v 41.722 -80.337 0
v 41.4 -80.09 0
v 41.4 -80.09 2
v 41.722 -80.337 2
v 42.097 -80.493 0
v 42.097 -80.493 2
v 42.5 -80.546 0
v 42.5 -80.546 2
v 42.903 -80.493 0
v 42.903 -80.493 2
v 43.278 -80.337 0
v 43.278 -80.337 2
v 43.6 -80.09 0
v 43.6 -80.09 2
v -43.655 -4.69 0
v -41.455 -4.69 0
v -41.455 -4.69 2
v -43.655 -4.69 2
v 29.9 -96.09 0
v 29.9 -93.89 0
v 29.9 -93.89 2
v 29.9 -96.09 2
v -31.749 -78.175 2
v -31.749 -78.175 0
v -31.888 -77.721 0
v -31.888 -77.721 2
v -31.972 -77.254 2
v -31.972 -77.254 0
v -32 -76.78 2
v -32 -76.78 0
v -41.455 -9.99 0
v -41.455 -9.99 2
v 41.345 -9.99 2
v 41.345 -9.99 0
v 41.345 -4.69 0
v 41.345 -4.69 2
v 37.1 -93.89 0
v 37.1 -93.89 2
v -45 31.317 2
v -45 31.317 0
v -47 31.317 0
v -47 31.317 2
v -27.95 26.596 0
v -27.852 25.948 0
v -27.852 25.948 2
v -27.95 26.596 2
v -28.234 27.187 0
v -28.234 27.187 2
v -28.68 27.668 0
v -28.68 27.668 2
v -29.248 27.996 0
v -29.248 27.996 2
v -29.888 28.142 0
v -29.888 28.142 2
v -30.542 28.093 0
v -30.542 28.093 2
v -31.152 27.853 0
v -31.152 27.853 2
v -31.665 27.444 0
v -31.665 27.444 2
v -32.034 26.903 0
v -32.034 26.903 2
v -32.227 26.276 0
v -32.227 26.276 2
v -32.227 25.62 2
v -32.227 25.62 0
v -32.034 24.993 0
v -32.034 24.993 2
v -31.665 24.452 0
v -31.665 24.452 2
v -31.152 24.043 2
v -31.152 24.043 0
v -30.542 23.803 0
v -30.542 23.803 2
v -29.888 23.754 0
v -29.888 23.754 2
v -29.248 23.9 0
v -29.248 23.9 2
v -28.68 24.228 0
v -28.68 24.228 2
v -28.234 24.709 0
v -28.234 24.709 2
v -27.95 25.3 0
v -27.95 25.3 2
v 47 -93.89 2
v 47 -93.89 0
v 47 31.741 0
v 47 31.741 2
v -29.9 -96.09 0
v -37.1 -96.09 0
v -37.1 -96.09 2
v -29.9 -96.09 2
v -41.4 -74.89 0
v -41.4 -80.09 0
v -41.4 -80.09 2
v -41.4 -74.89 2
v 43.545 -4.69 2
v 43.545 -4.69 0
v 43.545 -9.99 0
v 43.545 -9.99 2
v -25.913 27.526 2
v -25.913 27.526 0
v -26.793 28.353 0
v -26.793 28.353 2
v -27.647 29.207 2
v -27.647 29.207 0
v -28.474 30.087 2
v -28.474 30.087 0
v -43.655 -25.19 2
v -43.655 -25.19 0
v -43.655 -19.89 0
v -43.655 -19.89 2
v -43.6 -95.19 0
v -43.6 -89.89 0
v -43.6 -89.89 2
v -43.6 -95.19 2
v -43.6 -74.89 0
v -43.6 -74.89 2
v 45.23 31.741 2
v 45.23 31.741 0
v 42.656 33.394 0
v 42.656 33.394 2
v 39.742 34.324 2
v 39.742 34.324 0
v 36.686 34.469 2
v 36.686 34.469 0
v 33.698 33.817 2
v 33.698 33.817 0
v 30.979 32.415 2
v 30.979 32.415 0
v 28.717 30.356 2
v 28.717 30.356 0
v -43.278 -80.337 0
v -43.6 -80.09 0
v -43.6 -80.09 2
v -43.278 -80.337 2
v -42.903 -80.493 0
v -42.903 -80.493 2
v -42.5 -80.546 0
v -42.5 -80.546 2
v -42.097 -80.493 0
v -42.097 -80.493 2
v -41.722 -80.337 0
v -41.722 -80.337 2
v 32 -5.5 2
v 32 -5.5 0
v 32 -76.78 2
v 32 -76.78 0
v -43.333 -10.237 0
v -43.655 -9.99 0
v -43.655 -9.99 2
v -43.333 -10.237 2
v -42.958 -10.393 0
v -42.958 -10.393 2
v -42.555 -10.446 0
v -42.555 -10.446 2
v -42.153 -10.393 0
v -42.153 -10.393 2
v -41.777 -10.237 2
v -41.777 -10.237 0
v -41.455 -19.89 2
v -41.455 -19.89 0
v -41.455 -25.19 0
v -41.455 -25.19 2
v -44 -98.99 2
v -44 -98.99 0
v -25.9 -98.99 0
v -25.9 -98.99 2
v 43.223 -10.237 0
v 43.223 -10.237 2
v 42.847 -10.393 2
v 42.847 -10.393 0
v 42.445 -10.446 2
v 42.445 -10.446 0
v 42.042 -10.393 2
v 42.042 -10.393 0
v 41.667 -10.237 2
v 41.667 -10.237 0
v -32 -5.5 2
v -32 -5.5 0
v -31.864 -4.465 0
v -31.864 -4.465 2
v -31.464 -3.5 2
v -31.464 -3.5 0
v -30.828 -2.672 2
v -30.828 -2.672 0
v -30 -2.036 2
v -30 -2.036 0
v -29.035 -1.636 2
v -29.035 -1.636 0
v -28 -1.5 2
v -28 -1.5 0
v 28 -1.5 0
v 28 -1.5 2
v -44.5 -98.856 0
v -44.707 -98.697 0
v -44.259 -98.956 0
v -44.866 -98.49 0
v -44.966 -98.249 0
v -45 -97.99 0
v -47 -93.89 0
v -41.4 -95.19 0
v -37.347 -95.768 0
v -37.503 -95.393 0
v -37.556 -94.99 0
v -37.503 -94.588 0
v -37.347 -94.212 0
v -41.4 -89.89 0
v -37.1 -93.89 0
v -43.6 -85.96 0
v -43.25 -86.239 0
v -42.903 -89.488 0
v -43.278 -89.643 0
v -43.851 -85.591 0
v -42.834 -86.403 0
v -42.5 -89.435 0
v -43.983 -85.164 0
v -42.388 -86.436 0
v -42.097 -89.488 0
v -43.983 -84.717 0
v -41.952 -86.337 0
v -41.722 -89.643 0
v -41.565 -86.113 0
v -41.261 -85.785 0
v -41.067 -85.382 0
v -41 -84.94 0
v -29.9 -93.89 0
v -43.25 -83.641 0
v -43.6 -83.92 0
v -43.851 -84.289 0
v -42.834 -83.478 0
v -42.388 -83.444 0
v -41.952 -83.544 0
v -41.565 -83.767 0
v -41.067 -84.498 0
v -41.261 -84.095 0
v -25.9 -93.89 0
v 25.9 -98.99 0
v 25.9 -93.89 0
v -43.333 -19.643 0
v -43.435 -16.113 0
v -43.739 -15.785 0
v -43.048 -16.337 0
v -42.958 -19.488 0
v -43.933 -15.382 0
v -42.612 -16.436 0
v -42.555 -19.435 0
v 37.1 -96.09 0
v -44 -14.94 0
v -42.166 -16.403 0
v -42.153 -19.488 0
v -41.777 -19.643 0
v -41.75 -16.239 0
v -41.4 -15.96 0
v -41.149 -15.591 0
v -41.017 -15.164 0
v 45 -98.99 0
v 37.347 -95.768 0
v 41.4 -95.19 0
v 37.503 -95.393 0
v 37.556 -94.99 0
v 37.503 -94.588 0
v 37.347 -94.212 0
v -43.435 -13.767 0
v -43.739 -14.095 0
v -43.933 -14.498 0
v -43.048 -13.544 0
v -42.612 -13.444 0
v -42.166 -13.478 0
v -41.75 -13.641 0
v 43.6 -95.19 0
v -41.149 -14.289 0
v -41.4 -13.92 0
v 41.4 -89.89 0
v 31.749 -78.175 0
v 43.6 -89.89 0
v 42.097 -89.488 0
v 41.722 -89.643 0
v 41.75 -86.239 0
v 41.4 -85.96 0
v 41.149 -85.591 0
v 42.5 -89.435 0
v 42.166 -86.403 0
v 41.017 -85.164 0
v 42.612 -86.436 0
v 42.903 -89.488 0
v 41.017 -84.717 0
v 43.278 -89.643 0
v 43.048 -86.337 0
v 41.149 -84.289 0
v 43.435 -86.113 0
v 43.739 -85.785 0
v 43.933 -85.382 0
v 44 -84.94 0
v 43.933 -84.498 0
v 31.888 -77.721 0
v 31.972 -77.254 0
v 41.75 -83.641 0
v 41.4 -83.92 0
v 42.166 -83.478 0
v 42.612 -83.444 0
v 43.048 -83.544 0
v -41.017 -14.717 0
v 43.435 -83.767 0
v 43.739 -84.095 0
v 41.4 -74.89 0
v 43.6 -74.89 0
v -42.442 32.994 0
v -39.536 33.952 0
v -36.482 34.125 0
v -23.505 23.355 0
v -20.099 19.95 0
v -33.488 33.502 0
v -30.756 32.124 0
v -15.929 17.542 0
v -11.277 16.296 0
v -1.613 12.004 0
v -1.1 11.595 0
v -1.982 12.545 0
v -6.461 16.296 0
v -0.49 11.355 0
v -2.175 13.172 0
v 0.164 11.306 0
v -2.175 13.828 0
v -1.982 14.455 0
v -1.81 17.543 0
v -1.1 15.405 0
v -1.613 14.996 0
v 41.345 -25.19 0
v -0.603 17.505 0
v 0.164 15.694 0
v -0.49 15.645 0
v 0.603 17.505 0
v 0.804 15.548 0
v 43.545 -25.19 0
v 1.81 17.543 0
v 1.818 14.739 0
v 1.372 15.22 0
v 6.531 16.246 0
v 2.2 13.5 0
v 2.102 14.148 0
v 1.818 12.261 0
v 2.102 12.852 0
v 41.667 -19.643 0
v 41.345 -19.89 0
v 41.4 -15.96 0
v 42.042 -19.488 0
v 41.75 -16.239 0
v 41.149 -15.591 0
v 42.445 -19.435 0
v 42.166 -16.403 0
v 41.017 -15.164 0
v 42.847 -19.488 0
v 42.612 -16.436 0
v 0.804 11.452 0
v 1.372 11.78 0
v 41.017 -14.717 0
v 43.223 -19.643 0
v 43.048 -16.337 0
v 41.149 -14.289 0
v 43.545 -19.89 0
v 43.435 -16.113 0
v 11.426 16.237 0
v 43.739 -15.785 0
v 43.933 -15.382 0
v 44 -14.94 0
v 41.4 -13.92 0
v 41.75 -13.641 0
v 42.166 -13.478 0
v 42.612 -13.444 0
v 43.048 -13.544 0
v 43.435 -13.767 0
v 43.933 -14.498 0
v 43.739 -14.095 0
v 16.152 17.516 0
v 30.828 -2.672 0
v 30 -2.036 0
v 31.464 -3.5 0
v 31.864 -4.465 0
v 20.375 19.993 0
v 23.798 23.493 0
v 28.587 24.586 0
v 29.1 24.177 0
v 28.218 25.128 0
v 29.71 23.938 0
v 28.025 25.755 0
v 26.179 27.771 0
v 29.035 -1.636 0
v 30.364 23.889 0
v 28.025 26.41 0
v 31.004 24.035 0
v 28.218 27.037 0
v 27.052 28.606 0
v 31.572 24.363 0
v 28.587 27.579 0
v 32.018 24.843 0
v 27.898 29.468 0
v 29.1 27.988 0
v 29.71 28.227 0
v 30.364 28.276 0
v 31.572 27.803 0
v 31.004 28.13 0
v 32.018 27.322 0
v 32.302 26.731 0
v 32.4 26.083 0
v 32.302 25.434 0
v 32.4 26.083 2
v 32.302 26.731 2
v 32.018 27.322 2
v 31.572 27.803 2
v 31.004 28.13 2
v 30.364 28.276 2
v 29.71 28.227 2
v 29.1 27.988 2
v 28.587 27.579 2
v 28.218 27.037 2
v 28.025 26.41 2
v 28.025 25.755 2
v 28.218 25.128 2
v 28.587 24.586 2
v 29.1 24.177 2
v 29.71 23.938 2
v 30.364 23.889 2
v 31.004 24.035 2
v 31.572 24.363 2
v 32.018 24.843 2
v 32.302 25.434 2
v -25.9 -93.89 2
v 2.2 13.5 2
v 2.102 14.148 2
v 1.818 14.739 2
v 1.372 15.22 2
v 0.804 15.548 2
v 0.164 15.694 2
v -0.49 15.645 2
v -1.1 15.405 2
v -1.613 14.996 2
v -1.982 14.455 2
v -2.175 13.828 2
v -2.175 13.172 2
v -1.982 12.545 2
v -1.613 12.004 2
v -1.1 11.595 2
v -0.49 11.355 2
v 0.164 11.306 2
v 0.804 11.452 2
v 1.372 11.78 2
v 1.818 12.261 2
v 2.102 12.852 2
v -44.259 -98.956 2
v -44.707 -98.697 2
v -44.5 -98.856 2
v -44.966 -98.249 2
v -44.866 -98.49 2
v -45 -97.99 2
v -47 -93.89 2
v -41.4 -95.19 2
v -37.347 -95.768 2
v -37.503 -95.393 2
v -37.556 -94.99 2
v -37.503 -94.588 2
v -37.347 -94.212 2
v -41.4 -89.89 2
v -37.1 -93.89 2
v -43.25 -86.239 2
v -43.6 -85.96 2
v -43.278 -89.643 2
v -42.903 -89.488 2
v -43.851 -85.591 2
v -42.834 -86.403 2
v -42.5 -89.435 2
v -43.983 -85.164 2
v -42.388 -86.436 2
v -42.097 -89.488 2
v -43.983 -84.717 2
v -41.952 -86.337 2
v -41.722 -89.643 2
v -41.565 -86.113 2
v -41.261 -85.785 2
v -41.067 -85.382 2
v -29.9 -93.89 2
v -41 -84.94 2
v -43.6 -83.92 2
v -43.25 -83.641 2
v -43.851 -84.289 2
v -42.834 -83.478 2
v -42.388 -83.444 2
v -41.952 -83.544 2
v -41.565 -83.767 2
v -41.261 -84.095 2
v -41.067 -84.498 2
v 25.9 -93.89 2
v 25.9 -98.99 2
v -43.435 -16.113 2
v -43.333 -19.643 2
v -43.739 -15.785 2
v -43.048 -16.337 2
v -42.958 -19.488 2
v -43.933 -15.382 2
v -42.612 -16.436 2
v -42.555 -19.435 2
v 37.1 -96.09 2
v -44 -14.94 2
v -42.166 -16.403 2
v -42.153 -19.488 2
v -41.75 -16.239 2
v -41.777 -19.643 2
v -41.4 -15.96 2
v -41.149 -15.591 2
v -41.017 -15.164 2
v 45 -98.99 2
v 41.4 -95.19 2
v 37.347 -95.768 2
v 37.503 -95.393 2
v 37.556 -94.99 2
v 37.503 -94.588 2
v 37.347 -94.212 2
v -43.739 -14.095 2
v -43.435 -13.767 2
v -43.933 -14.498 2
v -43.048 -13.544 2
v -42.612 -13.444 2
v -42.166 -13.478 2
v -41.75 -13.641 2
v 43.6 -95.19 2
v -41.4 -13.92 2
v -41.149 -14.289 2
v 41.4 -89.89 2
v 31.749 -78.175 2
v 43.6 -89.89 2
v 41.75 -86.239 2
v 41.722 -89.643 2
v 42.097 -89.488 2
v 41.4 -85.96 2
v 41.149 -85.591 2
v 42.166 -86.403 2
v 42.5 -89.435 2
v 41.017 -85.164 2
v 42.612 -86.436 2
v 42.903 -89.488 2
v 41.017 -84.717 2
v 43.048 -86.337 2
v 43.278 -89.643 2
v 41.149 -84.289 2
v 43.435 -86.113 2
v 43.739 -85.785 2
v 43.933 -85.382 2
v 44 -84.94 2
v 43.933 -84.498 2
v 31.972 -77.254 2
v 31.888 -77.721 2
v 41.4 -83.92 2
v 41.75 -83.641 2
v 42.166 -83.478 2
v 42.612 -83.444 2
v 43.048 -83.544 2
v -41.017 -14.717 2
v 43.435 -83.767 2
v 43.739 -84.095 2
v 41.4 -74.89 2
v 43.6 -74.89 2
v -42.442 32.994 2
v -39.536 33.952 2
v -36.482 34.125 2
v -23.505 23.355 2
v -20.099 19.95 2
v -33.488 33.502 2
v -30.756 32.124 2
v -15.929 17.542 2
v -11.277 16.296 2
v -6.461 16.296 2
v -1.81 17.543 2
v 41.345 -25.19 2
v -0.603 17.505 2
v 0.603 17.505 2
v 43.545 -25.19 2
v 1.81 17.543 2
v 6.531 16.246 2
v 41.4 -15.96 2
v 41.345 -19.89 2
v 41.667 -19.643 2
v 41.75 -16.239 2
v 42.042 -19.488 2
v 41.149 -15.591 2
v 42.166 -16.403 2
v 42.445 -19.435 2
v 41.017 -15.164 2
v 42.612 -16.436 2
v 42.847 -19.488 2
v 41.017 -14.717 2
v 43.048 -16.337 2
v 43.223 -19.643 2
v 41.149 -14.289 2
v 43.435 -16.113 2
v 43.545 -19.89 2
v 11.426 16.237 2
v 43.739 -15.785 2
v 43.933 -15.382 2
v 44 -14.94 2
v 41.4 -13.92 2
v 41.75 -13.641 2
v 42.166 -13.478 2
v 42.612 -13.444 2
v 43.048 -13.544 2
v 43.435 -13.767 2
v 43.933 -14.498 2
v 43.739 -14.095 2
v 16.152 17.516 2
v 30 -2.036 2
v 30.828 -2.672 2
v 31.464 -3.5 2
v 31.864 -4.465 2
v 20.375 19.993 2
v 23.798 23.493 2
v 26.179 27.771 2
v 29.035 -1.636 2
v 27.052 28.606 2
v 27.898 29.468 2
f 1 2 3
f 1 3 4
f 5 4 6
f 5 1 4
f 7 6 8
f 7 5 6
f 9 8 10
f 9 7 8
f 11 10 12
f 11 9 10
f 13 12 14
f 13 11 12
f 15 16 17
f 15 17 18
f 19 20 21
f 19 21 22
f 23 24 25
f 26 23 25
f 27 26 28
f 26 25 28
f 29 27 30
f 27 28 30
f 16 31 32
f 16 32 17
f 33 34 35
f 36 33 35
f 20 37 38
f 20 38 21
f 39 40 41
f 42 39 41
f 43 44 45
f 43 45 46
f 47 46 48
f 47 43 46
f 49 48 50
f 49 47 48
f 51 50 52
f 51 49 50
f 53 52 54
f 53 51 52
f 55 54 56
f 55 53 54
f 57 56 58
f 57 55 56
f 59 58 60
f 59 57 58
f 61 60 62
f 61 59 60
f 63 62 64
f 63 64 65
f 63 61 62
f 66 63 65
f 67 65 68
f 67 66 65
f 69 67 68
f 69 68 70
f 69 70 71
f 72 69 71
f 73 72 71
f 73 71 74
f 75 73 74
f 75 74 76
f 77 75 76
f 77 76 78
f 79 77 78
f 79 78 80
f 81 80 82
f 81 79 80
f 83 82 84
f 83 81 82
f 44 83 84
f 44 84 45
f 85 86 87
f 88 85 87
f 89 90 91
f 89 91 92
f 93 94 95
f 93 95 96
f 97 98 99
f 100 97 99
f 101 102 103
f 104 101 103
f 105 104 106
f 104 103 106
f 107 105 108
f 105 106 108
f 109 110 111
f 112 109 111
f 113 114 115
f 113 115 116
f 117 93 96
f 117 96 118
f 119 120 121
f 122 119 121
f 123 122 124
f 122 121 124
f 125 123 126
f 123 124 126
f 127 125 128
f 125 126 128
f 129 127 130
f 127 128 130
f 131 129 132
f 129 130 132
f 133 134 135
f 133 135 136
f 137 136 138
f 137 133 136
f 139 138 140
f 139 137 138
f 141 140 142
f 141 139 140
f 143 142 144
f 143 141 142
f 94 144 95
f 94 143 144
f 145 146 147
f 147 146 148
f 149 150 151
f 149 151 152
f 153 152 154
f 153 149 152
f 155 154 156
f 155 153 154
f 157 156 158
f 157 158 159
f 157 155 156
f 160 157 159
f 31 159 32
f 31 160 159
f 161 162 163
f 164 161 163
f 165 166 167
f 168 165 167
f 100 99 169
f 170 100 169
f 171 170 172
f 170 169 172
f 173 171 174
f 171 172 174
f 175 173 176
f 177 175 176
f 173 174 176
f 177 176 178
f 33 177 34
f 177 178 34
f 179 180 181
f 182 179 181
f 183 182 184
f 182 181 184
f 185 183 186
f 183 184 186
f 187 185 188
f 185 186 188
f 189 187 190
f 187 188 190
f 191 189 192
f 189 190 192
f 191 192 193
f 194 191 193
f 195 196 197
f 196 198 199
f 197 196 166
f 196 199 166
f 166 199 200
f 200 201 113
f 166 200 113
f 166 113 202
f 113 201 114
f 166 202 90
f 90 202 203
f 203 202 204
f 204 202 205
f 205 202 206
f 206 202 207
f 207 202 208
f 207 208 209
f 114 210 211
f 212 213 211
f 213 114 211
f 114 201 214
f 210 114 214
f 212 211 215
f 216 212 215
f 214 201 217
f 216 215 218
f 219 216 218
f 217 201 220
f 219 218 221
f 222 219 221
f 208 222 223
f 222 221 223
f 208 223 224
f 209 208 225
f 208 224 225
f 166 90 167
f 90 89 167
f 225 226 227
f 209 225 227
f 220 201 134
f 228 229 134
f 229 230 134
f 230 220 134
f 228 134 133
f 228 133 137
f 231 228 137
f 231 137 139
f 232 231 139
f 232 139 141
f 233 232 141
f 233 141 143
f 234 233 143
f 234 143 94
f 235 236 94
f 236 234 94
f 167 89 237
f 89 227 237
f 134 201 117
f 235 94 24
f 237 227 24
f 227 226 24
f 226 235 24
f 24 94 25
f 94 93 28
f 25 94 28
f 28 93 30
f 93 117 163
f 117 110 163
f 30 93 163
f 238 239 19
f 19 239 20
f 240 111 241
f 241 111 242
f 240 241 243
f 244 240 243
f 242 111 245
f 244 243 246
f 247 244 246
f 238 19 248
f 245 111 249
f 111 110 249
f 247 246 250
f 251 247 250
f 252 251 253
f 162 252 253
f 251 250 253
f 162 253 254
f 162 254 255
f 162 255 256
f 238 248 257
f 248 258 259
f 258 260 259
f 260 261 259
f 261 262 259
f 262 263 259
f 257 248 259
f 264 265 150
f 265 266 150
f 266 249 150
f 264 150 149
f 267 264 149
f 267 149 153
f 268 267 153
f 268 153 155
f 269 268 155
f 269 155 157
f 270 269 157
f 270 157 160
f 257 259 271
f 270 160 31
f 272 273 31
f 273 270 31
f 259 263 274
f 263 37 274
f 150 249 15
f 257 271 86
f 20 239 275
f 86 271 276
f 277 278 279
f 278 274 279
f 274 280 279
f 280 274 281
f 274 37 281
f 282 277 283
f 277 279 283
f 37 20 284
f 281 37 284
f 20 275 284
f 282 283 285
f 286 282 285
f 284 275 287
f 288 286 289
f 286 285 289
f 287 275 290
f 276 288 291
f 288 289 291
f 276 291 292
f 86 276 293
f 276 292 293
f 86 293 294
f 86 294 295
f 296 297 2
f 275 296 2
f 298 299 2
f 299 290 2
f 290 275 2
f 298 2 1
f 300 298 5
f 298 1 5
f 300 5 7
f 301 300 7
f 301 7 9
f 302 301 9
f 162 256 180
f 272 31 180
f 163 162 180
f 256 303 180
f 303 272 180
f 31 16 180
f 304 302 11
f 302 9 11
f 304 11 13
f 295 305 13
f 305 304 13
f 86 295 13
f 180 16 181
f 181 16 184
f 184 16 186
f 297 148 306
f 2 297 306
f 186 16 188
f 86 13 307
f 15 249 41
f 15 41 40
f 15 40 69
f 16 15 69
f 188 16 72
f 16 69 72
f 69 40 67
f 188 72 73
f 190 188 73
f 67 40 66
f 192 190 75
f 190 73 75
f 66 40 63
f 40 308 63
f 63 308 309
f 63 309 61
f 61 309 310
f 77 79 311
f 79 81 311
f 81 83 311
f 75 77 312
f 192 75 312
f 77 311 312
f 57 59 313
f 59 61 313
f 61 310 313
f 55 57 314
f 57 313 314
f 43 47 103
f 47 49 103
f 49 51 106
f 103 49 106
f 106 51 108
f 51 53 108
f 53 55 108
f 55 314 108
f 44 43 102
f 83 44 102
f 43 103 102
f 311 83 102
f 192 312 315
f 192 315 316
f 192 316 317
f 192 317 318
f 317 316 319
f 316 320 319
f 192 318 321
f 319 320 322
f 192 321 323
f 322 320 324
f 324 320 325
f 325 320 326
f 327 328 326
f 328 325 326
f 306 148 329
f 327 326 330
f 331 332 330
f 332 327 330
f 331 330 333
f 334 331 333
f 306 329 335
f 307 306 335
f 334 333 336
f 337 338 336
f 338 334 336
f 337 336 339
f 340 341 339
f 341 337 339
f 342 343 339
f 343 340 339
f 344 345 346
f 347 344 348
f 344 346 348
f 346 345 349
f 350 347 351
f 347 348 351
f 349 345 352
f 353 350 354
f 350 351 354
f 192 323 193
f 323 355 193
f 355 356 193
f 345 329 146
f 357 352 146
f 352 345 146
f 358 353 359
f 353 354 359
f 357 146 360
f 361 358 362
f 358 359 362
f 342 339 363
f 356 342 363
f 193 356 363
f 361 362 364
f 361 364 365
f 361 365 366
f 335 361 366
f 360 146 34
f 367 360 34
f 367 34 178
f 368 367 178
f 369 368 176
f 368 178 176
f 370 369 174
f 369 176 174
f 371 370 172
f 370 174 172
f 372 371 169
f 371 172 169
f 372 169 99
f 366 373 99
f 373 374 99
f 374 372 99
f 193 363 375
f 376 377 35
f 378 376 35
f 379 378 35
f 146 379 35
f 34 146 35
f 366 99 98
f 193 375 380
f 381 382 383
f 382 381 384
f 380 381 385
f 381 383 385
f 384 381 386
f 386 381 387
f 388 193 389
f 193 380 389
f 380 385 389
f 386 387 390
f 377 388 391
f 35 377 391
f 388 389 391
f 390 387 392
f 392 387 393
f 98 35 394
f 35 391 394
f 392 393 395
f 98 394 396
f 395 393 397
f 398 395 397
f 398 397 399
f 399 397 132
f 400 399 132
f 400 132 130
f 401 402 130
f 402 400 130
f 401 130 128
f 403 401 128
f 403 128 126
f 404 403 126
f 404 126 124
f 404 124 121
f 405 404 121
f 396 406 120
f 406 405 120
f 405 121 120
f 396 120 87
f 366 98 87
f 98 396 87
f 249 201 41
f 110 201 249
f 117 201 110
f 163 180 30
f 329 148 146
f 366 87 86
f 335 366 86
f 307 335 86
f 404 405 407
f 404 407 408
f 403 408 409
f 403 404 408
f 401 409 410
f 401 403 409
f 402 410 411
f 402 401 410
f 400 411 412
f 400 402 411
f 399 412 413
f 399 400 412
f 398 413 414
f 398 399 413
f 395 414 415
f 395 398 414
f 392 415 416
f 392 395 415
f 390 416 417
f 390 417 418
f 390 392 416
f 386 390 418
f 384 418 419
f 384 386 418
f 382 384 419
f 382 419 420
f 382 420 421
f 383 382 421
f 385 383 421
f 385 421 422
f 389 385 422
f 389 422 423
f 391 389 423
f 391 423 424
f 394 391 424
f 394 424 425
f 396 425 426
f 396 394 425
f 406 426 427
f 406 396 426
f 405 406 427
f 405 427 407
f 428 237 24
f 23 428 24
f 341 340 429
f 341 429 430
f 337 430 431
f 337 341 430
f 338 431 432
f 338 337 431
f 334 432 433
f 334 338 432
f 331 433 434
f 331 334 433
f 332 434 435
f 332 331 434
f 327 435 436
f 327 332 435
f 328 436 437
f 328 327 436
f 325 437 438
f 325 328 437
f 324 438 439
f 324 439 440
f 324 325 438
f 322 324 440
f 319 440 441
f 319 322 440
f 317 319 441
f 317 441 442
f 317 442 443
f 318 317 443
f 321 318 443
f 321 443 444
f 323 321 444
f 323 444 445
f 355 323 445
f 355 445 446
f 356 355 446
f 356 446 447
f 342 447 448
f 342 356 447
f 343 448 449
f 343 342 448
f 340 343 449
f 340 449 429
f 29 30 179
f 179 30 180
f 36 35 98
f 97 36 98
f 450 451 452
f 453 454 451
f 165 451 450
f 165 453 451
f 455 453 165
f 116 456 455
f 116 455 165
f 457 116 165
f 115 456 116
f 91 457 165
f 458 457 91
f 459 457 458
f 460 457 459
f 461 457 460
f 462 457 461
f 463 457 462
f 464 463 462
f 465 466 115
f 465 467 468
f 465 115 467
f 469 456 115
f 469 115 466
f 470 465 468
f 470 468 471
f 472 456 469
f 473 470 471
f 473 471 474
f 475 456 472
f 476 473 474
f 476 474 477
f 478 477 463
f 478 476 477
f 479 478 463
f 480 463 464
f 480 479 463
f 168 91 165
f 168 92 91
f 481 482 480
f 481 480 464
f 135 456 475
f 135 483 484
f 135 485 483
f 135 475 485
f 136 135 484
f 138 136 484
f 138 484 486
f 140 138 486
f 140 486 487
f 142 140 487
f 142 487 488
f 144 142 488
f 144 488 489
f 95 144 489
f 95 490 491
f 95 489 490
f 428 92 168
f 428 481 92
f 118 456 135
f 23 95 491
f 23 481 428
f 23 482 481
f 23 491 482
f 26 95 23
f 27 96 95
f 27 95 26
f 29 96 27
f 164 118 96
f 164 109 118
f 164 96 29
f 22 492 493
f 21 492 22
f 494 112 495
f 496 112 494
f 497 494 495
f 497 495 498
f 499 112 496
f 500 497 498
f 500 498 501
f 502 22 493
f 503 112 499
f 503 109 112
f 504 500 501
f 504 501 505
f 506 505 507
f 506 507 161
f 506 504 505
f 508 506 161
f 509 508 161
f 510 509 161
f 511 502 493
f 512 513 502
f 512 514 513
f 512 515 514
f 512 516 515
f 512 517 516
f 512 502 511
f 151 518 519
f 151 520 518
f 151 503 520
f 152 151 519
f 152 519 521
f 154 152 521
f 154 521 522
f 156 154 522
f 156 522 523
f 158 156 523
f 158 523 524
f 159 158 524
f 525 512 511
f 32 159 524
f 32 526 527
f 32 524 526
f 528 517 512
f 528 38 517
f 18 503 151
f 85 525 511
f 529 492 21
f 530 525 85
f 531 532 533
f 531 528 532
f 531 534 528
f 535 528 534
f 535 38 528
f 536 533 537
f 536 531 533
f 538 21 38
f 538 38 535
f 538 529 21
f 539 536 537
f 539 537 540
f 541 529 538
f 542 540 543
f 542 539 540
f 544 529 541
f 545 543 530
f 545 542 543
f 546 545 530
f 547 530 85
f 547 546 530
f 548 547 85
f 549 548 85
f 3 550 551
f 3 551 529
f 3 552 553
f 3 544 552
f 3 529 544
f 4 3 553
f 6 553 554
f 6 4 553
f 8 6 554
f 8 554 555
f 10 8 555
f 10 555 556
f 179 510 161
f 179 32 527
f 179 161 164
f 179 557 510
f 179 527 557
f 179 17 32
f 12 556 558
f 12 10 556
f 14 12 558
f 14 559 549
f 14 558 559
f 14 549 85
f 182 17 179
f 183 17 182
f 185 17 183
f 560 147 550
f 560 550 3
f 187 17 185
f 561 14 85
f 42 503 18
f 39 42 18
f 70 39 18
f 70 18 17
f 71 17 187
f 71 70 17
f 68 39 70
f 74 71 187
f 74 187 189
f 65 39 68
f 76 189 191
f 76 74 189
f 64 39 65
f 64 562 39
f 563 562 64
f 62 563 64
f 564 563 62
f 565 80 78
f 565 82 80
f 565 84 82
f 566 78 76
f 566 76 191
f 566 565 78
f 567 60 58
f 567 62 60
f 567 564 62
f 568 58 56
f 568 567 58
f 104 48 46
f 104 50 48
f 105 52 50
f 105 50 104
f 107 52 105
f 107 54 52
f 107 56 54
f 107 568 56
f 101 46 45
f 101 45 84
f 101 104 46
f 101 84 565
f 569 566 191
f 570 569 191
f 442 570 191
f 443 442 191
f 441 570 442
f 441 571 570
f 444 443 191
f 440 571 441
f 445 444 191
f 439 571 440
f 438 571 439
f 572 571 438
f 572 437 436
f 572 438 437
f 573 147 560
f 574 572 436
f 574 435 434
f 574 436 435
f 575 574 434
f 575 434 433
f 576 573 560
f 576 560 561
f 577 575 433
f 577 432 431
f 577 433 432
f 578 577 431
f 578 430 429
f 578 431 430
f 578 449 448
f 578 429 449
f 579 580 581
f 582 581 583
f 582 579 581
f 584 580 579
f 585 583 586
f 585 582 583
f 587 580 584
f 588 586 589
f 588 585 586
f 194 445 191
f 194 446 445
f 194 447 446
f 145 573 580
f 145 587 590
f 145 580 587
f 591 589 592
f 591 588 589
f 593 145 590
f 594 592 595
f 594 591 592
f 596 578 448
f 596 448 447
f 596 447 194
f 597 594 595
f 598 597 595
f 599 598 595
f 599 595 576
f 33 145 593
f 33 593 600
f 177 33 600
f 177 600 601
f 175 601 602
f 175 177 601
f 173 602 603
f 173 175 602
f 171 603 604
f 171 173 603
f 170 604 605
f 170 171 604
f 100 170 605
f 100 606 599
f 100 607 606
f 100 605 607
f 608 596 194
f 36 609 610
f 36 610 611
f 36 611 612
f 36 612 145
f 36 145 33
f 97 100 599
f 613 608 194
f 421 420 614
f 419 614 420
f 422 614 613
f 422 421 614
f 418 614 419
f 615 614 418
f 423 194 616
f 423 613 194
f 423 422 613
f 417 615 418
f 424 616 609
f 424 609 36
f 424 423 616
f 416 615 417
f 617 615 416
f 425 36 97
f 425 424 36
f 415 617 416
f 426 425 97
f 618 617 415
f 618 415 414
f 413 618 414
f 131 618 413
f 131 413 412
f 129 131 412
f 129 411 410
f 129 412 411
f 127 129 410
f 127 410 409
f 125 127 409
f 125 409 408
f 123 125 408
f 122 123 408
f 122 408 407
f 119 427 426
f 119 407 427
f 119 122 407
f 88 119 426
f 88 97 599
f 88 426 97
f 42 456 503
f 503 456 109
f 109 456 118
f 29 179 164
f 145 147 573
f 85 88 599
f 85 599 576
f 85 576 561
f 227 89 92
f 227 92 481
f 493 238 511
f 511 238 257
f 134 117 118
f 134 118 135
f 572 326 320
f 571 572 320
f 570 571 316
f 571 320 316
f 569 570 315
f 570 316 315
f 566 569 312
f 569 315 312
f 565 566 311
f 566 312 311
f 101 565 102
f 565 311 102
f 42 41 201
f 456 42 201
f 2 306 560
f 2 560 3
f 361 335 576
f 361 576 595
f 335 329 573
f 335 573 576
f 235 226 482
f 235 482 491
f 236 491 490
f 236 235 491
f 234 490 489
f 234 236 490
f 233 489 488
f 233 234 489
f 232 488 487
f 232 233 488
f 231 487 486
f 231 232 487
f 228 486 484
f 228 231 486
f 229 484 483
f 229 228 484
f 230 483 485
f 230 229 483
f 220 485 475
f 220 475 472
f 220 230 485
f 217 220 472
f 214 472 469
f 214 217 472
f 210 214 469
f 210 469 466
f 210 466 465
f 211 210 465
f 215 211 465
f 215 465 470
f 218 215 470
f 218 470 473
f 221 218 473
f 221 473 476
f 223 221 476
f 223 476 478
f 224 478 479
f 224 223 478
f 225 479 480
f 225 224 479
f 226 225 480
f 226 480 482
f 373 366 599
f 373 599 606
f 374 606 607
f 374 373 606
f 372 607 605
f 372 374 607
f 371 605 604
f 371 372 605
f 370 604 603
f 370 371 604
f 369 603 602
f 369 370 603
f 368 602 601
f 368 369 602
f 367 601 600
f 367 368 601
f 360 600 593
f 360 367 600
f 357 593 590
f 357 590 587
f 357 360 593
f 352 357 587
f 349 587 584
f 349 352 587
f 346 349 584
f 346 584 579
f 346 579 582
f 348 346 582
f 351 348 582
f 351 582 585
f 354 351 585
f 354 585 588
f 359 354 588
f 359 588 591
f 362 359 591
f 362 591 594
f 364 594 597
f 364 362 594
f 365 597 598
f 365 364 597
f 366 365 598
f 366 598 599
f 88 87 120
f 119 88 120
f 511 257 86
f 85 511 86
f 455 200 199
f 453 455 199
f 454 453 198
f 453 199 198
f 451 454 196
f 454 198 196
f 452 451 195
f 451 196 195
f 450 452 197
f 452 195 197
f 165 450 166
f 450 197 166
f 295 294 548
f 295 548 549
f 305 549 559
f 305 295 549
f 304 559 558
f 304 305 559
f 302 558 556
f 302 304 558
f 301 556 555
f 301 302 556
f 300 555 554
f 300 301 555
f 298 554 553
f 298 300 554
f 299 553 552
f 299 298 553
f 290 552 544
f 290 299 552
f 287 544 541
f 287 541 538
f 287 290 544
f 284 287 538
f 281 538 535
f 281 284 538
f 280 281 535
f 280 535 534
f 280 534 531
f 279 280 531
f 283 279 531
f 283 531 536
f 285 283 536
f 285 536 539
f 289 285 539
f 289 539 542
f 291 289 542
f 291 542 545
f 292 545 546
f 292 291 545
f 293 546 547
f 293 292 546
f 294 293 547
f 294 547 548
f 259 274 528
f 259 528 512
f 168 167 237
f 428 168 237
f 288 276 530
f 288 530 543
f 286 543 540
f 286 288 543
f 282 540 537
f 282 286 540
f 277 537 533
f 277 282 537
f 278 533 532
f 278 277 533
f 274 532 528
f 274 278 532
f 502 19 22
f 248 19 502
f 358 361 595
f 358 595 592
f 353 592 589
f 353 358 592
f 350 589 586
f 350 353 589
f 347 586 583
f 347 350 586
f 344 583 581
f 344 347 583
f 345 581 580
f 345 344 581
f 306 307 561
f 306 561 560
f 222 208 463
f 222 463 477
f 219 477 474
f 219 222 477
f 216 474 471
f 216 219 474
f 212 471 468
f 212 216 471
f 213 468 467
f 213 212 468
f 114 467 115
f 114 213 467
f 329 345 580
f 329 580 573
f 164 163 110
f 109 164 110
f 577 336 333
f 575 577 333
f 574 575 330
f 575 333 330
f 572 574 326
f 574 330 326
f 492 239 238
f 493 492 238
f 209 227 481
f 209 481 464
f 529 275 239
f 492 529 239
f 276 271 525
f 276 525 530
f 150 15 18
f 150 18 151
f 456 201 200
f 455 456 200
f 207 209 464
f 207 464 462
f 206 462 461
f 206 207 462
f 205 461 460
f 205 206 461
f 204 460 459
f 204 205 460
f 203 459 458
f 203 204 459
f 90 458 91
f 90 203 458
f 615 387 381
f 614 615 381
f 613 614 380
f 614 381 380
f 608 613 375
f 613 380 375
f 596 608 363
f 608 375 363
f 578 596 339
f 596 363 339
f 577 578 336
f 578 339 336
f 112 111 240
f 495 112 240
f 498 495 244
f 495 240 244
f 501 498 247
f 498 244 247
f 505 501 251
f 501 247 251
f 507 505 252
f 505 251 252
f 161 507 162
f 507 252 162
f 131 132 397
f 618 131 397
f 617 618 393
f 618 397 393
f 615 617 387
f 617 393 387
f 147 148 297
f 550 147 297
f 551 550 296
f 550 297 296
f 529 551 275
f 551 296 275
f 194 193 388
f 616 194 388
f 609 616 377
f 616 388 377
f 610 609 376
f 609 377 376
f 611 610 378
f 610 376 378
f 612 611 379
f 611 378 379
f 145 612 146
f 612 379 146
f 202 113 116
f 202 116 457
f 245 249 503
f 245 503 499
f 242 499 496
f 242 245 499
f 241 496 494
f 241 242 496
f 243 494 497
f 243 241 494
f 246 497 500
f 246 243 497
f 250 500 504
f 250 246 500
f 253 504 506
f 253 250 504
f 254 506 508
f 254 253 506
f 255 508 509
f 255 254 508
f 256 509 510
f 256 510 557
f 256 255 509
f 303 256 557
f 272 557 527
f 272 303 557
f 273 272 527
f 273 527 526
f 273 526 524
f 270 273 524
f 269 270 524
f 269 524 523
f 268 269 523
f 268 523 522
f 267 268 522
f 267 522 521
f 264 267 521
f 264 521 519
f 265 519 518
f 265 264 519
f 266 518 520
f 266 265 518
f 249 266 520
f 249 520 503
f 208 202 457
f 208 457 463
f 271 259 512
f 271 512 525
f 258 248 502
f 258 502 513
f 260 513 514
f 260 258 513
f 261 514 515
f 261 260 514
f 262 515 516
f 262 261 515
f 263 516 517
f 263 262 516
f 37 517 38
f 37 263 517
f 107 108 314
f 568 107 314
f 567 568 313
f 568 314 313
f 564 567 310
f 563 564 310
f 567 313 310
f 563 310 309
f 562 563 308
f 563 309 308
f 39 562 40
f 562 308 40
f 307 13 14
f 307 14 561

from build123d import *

# Parameters (mm, degrees)
SKETCH_3_R      = 2.2
SKETCH_3_R_2    = 1.5
EXTRUDE_1_DEPTH = 2


with BuildPart() as part:
    # 草图3 → 凸台-拉伸1 (new body)
    with BuildSketch(Plane.XY):
        with BuildLine():
            Line((-47, 31.317051182), (-47, -93.890216685))
            Line((-47, -93.890216685), (-45, -97.990216685))
            ThreePointArc((-45, -97.990216685), (-44.707106781, -98.697323466), (-44, -98.990216685))
            Line((-44, -98.990216685), (-25.9, -98.990216685))
            Line((-25.9, -98.990216685), (-25.9, -97.990216685))
            Line((-25.9, -97.990216685), (-25.9, -93.890216685))
            Line((-25.9, -93.890216685), (-31.748789112, -78.174983751))
            ThreePointArc((-31.748789112, -78.174983751), (-31.936696359, -77.488601938), (-32, -76.779784772))
            Line((-32, -76.779784772), (-32, -5.5))
            ThreePointArc((-32, -5.5), (-30.828427125, -2.671572875), (-28, -1.5))
            Line((-28, -1.5), (28, -1.5))
            ThreePointArc((28, -1.5), (30.828427125, -2.671572875), (32, -5.5))
            Line((32, -5.5), (32, -76.779784772))
            ThreePointArc((32, -76.779784772), (31.936696359, -77.488601938), (31.748789112, -78.174983751))
            Line((31.748789112, -78.174983751), (25.9, -93.890216685))
            Line((25.9, -93.890216685), (25.9, -97.990216685))
            Line((25.9, -97.990216685), (25.9, -98.990216685))
            Line((25.9, -98.990216685), (45, -98.990216685))
            Line((45, -98.990216685), (47, -93.890216685))
            Line((47, -93.890216685), (47, 31.741152315))
            Line((47, 31.741152315), (45.230037269, 31.741152315))
            ThreePointArc((45.230037269, 31.741152315), (36.686440181, 34.468680322), (28.716551195, 30.356098435))
            ThreePointArc((28.716551195, 30.356098435), (27.478316584, 29.033500084), (26.179230338, 27.770619934))
            ThreePointArc((26.179230338, 27.770619934), (16.152230905, 17.515551518), (1.809761925, 17.542559084))
            ThreePointArc((1.809761925, 17.542559084), (0, 17.5), (-1.809761925, 17.542559084))
            ThreePointArc((-1.809761925, 17.542559084), (-15.928828372, 17.542283516), (-25.912710857, 27.525776288))
            ThreePointArc((-25.912710857, 27.525776288), (-27.223611076, 28.776388924), (-28.474223712, 30.087289143))
            ThreePointArc((-28.474223712, 30.087289143), (-36.482419799, 34.124770496), (-45, 31.317051182))
            Line((-45, 31.317051182), (-47, 31.317051182))
        make_face()
        with Locations((0, 13.5)):
            Circle(SKETCH_3_R, mode=Mode.SUBTRACT)
        with Locations((-30.052038202, 25.947961669)):
            Circle(SKETCH_3_R, mode=Mode.SUBTRACT)
        with Locations((30.199957913, 26.082571452)):
            Circle(SKETCH_3_R, mode=Mode.SUBTRACT)
        with Locations((42.5, -14.940216685)):
            Circle(SKETCH_3_R_2, mode=Mode.SUBTRACT)
        with Locations(Location((-42.5, -14.940216685, 0), (0, 0, 180))):
            Circle(SKETCH_3_R_2, mode=Mode.SUBTRACT)
        with Locations((42.5, -84.940216685)):
            Circle(SKETCH_3_R_2, mode=Mode.SUBTRACT)
        with Locations((-42.5, -84.940216685)):
            Circle(SKETCH_3_R_2, mode=Mode.SUBTRACT)
        with BuildLine():
            Line((-37.1, -96.090216685), (-29.9, -96.090216685))
            Line((-29.9, -96.090216685), (-29.9, -93.890216685))
            Line((-29.9, -93.890216685), (-37.1, -93.890216685))
            ThreePointArc((-37.1, -93.890216685), (-37.555634919, -94.990216685), (-37.1, -96.090216685))
        make_face(mode=Mode.SUBTRACT)
        with BuildLine():
            Line((-41.45513954, -19.890216685), (-41.45513954, -25.190216685))
            Line((-41.45513954, -25.190216685), (-43.65513954, -25.190216685))
            Line((-43.65513954, -25.190216685), (-43.65513954, -19.890216685))
            ThreePointArc((-43.65513954, -19.890216685), (-42.55513954, -19.434581767), (-41.45513954, -19.890216685))
        make_face(mode=Mode.SUBTRACT)
        with BuildLine():
            Line((37.1, -93.890216685), (29.9, -93.890216685))
            Line((29.9, -93.890216685), (29.9, -96.090216685))
            Line((29.9, -96.090216685), (37.1, -96.090216685))
            ThreePointArc((37.1, -96.090216685), (37.555634919, -94.990216685), (37.1, -93.890216685))
        make_face(mode=Mode.SUBTRACT)
        with BuildLine():
            Line((43.54486046, -25.190216685), (43.54486046, -19.890216685))
            ThreePointArc((43.54486046, -19.890216685), (42.44486046, -19.434581767), (41.34486046, -19.890216685))
            Line((41.34486046, -19.890216685), (41.34486046, -25.190216685))
            Line((41.34486046, -25.190216685), (43.54486046, -25.190216685))
        make_face(mode=Mode.SUBTRACT)
        with BuildLine():
            Line((41.34486046, -9.990216685), (41.34486046, -4.690216685))
            Line((41.34486046, -4.690216685), (43.54486046, -4.690216685))
            Line((43.54486046, -4.690216685), (43.54486046, -9.990216685))
            ThreePointArc((43.54486046, -9.990216685), (42.44486046, -10.445851604), (41.34486046, -9.990216685))
        make_face(mode=Mode.SUBTRACT)
        with BuildLine():
            Line((43.6, -95.190216685), (43.6, -89.890216685))
            ThreePointArc((43.6, -89.890216685), (42.5, -89.434581767), (41.4, -89.890216685))
            Line((41.4, -89.890216685), (41.4, -95.190216685))
            Line((41.4, -95.190216685), (43.6, -95.190216685))
        make_face(mode=Mode.SUBTRACT)
        with BuildLine():
            Line((41.4, -74.890216685), (41.4, -80.090216685))
            ThreePointArc((41.4, -80.090216685), (42.5, -80.545851604), (43.6, -80.090216685))
            Line((43.6, -80.090216685), (43.6, -74.890216685))
            Line((43.6, -74.890216685), (41.4, -74.890216685))
        make_face(mode=Mode.SUBTRACT)
        with BuildLine():
            Line((-41.4, -95.190216685), (-41.4, -89.890216685))
            ThreePointArc((-41.4, -89.890216685), (-42.5, -89.434581767), (-43.6, -89.890216685))
            Line((-43.6, -89.890216685), (-43.6, -95.190216685))
            Line((-43.6, -95.190216685), (-41.4, -95.190216685))
        make_face(mode=Mode.SUBTRACT)
        with BuildLine():
            Line((-43.6, -74.890216685), (-43.6, -80.090216685))
            ThreePointArc((-43.6, -80.090216685), (-42.5, -80.545851604), (-41.4, -80.090216685))
            Line((-41.4, -80.090216685), (-41.4, -74.890216685))
            Line((-41.4, -74.890216685), (-43.6, -74.890216685))
        make_face(mode=Mode.SUBTRACT)
        with BuildLine():
            Line((-43.65513954, -4.690216685), (-43.65513954, -9.990216685))
            ThreePointArc((-43.65513954, -9.990216685), (-42.55513954, -10.445851604), (-41.45513954, -9.990216685))
            Line((-41.45513954, -9.990216685), (-41.45513954, -4.690216685))
            Line((-41.45513954, -4.690216685), (-43.65513954, -4.690216685))
        make_face(mode=Mode.SUBTRACT)
    extrude(amount=EXTRUDE_1_DEPTH)


solid = part.part
